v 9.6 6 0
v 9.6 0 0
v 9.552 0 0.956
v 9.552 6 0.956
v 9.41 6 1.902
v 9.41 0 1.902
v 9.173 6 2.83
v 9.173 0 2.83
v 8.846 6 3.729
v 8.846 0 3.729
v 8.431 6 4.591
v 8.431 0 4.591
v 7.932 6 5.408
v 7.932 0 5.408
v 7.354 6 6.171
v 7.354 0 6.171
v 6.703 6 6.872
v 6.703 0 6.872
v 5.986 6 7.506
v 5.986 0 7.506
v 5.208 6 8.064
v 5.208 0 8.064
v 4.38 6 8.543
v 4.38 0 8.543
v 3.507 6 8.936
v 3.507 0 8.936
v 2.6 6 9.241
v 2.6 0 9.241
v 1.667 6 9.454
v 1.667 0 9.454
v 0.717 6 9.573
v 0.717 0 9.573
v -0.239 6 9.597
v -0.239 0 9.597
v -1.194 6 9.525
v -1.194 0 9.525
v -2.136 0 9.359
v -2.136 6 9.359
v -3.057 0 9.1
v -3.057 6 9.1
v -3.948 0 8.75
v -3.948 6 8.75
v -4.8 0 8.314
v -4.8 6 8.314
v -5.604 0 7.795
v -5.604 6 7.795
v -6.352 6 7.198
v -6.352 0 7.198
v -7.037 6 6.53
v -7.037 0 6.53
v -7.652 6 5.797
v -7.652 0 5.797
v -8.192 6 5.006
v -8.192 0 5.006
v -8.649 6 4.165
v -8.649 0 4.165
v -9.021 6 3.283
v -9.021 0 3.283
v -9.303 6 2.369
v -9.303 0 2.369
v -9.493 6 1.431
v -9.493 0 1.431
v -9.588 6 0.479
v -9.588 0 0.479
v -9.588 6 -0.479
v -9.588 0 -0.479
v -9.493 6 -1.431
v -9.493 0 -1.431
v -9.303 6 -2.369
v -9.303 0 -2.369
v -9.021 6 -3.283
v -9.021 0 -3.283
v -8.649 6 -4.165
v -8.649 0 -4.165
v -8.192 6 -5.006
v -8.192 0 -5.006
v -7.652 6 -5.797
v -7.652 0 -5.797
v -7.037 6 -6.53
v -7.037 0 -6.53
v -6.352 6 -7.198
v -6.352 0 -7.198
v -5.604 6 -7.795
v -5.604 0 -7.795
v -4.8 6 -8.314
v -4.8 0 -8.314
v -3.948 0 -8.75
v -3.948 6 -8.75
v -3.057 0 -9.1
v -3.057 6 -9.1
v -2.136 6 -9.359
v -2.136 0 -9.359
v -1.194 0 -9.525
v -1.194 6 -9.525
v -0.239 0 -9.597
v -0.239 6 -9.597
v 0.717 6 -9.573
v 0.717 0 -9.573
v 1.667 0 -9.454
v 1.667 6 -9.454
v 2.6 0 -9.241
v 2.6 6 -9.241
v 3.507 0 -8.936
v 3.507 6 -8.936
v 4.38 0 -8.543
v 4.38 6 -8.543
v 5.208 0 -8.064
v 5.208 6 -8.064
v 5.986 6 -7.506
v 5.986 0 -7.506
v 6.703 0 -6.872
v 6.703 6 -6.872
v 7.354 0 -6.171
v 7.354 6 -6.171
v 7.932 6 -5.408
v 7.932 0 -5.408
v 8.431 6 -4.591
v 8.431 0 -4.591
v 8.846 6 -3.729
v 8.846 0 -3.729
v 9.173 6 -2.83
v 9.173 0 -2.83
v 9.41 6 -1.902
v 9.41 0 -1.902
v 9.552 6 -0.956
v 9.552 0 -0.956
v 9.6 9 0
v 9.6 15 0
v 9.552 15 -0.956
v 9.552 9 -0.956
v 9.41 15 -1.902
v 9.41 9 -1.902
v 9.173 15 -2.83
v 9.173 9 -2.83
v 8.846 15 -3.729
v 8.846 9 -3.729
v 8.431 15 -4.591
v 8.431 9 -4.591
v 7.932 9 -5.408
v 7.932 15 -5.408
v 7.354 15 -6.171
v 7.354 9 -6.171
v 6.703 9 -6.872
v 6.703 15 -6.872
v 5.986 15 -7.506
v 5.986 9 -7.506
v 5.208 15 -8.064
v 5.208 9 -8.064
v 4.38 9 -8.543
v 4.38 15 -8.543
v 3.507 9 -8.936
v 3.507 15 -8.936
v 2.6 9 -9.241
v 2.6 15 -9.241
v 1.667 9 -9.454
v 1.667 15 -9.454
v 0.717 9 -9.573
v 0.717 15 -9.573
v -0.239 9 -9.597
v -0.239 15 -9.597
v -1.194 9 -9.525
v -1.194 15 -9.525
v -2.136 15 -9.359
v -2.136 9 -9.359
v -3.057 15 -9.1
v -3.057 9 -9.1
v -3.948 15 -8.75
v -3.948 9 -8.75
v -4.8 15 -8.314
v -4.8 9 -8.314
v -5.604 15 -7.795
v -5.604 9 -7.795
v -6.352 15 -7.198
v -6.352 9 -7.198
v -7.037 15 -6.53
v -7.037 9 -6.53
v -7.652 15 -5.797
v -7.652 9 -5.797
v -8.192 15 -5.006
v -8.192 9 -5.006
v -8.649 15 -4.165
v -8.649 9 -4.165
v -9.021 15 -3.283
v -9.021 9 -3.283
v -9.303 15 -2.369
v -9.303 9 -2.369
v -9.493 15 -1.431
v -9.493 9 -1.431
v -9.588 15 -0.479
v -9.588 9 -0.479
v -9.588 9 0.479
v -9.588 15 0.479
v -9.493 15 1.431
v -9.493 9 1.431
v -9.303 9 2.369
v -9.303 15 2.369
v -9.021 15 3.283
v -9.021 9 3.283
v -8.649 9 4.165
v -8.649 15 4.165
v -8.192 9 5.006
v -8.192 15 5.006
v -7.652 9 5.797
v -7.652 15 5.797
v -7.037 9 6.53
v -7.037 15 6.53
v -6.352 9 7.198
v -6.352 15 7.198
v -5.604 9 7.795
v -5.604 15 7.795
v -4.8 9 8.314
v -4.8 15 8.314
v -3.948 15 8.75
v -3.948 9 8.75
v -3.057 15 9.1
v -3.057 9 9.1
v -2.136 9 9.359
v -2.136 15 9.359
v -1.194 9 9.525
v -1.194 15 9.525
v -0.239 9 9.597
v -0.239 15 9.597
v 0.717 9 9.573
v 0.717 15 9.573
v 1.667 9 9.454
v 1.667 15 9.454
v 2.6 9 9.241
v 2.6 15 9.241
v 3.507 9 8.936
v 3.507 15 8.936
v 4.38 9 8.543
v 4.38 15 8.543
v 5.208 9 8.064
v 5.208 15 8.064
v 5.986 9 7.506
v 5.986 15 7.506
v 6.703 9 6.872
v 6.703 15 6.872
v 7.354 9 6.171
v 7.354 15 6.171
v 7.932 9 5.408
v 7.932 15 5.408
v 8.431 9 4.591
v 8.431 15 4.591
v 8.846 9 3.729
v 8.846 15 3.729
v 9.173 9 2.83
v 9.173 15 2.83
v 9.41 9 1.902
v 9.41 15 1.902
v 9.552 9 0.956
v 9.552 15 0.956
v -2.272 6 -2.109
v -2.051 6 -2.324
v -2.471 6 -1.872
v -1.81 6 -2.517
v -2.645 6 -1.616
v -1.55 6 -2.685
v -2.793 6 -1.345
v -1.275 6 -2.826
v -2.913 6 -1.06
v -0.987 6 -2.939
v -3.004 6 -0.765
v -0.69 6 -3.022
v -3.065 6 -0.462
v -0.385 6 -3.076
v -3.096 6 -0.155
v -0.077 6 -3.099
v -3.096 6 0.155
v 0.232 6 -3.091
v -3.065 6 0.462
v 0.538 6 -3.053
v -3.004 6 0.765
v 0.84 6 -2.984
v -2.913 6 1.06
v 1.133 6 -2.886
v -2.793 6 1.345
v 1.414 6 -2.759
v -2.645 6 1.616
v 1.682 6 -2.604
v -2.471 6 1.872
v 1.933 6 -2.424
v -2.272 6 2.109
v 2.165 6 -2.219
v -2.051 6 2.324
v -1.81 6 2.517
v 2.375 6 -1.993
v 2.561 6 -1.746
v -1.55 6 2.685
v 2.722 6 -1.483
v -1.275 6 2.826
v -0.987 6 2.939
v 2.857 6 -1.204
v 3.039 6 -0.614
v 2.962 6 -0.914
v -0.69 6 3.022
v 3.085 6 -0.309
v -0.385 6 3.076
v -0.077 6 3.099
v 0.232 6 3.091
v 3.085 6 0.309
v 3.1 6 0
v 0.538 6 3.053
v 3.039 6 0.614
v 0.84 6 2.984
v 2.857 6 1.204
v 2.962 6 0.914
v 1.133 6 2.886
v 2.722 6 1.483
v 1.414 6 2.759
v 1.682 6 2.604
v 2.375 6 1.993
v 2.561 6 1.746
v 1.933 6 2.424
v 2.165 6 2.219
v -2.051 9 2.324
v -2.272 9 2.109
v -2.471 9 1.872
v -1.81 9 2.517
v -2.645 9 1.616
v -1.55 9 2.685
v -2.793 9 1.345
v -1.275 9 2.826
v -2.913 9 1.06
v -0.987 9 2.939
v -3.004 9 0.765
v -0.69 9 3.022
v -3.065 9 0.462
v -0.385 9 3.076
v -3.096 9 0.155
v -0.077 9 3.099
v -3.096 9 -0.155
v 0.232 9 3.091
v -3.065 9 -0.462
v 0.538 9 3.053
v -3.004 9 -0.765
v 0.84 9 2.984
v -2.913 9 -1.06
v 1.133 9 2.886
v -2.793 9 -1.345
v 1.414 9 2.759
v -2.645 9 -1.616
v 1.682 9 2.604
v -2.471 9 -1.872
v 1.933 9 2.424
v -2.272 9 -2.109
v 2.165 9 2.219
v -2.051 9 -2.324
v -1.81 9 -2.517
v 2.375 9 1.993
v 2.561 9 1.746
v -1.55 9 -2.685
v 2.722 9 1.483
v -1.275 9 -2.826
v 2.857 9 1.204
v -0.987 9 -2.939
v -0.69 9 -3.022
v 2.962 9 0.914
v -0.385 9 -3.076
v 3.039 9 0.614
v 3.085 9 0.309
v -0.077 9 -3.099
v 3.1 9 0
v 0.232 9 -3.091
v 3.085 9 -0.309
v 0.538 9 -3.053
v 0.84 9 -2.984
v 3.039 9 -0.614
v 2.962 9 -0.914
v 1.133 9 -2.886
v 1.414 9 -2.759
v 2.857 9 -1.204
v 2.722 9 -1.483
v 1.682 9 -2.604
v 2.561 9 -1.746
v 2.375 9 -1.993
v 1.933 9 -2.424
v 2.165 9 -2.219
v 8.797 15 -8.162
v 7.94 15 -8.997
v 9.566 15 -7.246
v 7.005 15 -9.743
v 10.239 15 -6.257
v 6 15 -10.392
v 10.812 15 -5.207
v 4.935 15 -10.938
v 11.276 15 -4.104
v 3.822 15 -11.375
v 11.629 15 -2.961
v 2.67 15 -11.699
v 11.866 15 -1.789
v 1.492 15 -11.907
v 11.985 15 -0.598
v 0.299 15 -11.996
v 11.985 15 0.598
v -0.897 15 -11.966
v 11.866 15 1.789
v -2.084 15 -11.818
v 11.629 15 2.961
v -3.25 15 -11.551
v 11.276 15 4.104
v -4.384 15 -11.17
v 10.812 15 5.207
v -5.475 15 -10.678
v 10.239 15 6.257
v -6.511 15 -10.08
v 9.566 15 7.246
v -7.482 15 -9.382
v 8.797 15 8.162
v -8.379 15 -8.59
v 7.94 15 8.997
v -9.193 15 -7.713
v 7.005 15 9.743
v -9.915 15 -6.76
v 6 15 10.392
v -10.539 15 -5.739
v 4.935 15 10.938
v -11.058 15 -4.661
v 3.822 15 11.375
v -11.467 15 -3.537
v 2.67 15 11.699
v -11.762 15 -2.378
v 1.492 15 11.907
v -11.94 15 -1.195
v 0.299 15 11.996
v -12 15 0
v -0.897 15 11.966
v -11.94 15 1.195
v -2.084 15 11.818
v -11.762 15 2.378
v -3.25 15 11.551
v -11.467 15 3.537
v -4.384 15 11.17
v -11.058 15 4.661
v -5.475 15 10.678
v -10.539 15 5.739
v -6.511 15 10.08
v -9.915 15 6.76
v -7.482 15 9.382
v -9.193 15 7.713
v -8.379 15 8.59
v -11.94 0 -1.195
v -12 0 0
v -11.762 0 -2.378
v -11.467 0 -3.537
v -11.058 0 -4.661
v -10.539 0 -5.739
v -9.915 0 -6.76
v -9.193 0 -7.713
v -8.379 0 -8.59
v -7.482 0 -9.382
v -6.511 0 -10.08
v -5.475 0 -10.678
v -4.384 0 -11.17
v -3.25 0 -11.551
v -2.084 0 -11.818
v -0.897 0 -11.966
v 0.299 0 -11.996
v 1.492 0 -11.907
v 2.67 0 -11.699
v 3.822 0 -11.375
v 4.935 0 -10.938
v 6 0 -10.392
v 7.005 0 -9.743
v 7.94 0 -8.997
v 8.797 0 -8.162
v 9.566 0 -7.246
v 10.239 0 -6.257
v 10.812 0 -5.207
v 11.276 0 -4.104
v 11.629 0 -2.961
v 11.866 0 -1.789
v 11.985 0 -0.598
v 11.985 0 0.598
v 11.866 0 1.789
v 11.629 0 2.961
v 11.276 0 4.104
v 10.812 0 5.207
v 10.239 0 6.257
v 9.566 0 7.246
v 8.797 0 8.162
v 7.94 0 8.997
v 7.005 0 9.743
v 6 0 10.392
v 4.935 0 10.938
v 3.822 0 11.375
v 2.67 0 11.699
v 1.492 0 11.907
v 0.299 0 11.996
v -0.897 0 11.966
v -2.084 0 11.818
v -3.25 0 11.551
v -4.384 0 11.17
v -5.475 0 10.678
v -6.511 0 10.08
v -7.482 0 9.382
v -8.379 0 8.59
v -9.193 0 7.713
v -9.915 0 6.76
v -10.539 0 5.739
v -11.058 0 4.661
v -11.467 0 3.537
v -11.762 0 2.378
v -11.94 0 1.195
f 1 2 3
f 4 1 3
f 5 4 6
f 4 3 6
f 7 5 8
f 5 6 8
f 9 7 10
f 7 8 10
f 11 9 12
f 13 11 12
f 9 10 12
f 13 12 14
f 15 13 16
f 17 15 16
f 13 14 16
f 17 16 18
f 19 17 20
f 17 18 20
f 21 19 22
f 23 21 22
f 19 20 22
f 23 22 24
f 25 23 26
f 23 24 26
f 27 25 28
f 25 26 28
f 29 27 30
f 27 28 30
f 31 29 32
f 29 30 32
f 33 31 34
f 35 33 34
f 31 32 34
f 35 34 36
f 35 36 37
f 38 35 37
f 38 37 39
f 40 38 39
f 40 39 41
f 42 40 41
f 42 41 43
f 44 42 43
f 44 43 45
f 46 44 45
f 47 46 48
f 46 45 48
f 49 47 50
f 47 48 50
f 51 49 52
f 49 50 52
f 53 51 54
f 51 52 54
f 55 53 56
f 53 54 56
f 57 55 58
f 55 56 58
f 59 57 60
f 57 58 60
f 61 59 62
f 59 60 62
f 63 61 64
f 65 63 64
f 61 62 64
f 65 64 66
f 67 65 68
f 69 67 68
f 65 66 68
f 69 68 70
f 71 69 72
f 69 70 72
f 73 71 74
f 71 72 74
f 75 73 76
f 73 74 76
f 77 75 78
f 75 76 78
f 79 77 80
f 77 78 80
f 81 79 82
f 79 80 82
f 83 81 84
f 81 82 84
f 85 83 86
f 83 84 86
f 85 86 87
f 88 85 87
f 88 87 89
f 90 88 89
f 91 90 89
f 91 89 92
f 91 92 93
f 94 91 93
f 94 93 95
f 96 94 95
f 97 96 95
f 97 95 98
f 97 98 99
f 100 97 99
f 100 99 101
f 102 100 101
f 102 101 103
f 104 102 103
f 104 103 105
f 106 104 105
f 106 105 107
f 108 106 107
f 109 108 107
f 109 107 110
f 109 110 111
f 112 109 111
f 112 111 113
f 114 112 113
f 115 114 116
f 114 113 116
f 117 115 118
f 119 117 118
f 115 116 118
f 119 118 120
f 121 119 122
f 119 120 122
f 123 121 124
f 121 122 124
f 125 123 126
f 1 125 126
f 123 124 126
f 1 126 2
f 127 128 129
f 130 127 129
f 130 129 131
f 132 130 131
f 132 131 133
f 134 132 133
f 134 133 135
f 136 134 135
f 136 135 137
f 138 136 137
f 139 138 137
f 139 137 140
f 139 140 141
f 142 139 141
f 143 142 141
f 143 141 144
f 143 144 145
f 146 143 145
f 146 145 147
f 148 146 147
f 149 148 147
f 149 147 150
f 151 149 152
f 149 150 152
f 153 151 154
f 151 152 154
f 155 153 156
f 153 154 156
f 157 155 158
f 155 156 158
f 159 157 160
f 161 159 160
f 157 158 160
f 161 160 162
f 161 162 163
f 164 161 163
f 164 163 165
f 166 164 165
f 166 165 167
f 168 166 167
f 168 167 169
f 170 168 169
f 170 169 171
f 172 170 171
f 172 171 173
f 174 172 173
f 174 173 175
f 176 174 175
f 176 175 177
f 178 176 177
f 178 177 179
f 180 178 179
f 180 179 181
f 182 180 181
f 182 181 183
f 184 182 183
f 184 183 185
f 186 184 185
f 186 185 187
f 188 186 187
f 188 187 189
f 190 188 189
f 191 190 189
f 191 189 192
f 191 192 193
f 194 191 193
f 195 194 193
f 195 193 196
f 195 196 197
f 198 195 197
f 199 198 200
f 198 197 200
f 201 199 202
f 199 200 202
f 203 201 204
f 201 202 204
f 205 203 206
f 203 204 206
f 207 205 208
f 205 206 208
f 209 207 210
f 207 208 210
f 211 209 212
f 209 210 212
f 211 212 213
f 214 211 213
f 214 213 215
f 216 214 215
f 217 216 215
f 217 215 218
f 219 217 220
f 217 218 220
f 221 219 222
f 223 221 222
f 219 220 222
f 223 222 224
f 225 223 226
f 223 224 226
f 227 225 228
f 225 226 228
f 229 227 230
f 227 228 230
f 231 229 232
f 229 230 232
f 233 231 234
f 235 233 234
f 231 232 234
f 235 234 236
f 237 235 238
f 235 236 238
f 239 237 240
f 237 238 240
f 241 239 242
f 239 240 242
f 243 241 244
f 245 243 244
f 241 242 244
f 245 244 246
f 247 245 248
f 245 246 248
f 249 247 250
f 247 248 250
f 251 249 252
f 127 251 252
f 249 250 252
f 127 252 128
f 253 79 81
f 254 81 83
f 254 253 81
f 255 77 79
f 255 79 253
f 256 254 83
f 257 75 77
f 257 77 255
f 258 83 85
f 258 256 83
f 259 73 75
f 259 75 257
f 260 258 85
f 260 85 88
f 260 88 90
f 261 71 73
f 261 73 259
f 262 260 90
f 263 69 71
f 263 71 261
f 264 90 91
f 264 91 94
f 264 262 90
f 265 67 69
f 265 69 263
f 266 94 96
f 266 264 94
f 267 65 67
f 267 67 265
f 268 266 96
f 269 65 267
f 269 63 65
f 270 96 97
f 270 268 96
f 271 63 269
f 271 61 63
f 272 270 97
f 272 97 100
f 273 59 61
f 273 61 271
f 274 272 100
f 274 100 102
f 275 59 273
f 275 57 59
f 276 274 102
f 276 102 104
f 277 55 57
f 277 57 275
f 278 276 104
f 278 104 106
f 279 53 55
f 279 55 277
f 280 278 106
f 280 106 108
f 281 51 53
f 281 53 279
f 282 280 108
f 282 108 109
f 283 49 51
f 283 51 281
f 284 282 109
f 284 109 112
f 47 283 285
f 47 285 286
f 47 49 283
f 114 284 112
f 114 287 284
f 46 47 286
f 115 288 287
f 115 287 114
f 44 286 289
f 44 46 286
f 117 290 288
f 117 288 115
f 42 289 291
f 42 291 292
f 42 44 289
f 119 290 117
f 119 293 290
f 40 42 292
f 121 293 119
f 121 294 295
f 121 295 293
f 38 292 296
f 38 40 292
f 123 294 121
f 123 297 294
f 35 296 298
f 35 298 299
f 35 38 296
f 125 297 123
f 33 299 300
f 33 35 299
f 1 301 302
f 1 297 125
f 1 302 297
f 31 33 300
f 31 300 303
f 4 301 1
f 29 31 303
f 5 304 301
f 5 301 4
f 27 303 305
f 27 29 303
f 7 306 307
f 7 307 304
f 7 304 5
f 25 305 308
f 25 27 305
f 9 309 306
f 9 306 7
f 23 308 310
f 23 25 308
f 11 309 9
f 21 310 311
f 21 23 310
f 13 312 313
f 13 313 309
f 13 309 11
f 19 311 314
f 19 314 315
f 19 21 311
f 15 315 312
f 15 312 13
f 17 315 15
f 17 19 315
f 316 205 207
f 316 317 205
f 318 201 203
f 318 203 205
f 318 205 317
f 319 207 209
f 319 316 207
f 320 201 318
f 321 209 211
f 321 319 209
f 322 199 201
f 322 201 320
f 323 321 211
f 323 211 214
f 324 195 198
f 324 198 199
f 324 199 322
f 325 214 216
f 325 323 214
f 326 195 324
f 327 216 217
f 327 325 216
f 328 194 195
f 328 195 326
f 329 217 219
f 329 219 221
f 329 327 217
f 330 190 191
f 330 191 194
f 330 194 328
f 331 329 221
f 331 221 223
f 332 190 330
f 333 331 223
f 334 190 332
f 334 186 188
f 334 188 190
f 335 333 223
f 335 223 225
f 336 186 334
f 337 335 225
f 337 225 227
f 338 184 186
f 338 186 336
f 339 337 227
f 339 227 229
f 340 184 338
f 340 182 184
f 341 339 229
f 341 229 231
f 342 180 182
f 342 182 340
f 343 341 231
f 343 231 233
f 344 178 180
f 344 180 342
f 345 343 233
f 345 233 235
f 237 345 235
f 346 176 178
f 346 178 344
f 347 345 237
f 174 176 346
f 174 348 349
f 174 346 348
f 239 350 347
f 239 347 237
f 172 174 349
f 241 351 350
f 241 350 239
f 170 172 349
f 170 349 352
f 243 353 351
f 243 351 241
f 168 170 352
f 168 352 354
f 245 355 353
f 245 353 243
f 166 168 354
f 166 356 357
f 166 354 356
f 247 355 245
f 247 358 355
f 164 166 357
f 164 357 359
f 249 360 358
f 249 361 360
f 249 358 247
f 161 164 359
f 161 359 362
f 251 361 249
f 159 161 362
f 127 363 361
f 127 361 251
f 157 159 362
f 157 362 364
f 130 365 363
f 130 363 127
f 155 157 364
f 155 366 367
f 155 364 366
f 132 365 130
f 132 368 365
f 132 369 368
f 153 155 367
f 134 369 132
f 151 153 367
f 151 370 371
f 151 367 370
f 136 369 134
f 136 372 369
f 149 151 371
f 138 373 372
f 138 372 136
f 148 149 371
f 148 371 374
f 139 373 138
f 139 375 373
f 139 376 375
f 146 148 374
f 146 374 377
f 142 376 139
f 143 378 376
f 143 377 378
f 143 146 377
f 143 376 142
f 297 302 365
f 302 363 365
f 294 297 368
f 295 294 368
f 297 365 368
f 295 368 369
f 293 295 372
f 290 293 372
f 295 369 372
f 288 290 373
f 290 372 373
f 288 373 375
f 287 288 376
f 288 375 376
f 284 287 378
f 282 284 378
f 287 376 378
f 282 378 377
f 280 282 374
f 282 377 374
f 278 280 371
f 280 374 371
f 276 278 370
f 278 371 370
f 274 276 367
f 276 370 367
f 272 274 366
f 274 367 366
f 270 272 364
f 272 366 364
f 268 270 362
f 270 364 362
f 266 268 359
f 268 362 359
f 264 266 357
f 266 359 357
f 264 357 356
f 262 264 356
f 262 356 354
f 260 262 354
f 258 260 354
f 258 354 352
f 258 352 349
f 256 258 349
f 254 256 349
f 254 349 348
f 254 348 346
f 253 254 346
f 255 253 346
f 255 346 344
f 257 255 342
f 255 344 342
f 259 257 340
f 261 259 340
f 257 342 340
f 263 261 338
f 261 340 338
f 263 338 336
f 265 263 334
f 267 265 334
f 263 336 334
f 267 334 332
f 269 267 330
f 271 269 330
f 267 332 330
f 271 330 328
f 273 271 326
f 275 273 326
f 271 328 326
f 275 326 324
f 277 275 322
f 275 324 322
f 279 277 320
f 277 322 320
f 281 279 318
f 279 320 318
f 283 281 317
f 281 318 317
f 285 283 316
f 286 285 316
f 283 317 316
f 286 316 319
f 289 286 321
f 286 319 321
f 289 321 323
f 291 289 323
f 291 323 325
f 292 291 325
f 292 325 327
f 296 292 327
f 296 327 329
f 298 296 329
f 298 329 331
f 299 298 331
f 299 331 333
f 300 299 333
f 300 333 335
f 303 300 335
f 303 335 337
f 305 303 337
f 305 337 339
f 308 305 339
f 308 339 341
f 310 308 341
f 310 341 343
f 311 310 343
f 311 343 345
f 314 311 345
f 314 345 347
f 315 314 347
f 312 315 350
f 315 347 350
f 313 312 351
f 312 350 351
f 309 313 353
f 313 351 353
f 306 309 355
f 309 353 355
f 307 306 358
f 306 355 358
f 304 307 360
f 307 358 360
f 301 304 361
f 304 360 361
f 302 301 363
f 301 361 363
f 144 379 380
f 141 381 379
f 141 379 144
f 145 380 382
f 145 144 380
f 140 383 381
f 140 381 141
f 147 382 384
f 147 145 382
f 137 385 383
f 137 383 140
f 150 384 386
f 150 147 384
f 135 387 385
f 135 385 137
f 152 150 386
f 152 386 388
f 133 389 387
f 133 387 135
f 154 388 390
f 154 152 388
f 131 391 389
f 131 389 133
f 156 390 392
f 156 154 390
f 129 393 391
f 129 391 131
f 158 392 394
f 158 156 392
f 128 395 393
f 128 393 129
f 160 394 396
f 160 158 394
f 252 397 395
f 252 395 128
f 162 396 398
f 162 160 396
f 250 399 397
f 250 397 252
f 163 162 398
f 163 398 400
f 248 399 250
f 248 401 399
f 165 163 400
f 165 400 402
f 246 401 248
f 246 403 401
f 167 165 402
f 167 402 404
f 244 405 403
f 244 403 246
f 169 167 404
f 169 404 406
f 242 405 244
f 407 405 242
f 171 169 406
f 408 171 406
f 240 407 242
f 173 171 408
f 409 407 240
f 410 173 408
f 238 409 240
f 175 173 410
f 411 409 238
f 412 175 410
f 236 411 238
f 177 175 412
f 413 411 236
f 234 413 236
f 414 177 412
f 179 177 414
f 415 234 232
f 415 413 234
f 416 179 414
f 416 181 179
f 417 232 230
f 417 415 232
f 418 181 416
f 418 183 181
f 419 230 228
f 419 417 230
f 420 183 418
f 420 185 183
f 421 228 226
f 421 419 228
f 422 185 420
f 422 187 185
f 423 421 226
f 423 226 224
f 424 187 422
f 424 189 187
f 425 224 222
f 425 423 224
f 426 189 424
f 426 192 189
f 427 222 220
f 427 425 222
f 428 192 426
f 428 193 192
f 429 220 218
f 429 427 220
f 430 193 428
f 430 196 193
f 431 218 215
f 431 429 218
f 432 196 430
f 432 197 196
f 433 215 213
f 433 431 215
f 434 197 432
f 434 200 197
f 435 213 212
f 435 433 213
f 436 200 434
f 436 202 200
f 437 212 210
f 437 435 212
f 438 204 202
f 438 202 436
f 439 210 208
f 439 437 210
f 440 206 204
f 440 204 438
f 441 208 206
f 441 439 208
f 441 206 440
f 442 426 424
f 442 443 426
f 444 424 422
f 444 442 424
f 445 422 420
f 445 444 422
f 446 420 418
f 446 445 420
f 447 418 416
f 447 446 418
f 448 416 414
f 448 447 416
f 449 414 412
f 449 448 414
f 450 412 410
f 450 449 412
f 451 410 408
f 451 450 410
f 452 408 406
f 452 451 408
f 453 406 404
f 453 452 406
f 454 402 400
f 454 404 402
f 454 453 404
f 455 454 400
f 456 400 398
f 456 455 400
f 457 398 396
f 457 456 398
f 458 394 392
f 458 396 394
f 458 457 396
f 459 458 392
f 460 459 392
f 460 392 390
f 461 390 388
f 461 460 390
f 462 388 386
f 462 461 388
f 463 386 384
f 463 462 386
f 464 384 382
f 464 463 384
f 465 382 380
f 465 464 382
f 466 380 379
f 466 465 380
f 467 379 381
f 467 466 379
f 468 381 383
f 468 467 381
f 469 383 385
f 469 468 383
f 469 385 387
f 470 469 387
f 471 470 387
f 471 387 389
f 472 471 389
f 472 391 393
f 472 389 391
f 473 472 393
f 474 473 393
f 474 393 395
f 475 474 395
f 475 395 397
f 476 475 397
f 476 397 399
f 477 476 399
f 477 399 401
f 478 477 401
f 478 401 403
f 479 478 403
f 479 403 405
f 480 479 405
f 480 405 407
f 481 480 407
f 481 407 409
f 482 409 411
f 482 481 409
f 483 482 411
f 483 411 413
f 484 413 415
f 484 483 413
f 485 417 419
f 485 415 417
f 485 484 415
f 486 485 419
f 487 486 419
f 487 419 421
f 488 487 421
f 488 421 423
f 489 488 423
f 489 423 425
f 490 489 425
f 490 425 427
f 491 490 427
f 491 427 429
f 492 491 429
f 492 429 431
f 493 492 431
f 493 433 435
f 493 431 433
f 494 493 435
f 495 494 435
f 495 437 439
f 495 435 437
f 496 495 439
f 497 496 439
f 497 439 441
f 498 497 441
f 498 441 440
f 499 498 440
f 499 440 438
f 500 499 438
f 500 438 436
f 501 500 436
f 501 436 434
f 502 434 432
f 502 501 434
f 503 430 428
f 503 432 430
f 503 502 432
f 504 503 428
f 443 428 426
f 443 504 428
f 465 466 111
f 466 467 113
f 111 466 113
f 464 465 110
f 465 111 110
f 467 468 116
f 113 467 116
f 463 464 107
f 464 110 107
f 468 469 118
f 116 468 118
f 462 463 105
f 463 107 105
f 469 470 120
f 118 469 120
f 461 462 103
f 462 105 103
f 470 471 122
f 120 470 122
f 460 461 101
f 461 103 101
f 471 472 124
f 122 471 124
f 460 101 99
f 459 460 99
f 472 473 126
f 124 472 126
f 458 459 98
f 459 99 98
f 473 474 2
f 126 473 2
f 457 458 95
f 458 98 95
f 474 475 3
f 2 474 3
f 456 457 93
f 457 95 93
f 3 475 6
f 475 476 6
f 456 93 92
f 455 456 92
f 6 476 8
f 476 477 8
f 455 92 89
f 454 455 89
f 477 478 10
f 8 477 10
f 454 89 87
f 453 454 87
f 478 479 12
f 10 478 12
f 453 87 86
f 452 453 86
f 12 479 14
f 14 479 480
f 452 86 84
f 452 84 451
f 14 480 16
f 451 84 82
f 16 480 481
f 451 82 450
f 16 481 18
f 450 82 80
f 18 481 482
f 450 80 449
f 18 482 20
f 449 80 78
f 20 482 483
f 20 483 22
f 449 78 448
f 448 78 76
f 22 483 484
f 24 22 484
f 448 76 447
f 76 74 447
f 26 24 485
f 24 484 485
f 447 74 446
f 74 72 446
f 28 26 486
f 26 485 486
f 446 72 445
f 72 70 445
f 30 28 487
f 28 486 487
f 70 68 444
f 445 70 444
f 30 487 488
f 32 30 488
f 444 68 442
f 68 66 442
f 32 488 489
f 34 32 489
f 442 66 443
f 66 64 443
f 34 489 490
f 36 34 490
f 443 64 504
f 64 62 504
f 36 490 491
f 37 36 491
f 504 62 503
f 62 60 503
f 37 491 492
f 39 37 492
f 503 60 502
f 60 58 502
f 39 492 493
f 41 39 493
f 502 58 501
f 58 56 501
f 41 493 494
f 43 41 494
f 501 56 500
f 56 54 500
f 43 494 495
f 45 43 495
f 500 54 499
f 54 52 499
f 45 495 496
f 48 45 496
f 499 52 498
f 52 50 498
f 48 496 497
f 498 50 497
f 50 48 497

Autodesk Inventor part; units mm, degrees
ref_plane "YZ Plane" through (0, 0, 0) normal (1, 0, 0) x (0, 1, 0)
ref_plane "XZ Plane" through (0, 0, 0) normal (0, 1, 0) x (-1, 0, 0)
ref_plane "XY Plane" through (0, 0, 0) normal (0, 0, 1) x (1, 0, 0)
sketch "Sketch1" plane through (0, 0, 0) normal (0, 1, 0) x (-1, 0, 0)
  circle A0 centre (0, 0) radius 12
  dimension "d1" = 24
extrude "Extrusion1" add sketch "Sketch1" along normal blind 15
sketch "Sketch2" plane through (0, 15, 0) normal (0, 1, 0) x (1, 0, 0)
  circle A0 centre (0, 0) radius 9.6
  dimension "d4" = 19.2
extrude "Extrusion2" cut sketch "Sketch2" against normal blind 6
sketch "Sketch3" plane through (0, 0, 0) normal (0, -1, 0) x (1, 0, 0)
  circle A0 centre (0, 0) radius 9.6
  dimension "d7" = 19.2
extrude "Extrusion3" cut sketch "Sketch3" against normal blind 6
sketch "Sketch4" plane through (0, 9, 0) normal (0, 1, 0) x (1, 0, 0)
  circle A0 centre (0, 0) radius 3.1
  dimension "d10" = 6.2
extrude "Extrusion4" cut sketch "Sketch4" against normal blind 6
properties part number "Belt tensor"
